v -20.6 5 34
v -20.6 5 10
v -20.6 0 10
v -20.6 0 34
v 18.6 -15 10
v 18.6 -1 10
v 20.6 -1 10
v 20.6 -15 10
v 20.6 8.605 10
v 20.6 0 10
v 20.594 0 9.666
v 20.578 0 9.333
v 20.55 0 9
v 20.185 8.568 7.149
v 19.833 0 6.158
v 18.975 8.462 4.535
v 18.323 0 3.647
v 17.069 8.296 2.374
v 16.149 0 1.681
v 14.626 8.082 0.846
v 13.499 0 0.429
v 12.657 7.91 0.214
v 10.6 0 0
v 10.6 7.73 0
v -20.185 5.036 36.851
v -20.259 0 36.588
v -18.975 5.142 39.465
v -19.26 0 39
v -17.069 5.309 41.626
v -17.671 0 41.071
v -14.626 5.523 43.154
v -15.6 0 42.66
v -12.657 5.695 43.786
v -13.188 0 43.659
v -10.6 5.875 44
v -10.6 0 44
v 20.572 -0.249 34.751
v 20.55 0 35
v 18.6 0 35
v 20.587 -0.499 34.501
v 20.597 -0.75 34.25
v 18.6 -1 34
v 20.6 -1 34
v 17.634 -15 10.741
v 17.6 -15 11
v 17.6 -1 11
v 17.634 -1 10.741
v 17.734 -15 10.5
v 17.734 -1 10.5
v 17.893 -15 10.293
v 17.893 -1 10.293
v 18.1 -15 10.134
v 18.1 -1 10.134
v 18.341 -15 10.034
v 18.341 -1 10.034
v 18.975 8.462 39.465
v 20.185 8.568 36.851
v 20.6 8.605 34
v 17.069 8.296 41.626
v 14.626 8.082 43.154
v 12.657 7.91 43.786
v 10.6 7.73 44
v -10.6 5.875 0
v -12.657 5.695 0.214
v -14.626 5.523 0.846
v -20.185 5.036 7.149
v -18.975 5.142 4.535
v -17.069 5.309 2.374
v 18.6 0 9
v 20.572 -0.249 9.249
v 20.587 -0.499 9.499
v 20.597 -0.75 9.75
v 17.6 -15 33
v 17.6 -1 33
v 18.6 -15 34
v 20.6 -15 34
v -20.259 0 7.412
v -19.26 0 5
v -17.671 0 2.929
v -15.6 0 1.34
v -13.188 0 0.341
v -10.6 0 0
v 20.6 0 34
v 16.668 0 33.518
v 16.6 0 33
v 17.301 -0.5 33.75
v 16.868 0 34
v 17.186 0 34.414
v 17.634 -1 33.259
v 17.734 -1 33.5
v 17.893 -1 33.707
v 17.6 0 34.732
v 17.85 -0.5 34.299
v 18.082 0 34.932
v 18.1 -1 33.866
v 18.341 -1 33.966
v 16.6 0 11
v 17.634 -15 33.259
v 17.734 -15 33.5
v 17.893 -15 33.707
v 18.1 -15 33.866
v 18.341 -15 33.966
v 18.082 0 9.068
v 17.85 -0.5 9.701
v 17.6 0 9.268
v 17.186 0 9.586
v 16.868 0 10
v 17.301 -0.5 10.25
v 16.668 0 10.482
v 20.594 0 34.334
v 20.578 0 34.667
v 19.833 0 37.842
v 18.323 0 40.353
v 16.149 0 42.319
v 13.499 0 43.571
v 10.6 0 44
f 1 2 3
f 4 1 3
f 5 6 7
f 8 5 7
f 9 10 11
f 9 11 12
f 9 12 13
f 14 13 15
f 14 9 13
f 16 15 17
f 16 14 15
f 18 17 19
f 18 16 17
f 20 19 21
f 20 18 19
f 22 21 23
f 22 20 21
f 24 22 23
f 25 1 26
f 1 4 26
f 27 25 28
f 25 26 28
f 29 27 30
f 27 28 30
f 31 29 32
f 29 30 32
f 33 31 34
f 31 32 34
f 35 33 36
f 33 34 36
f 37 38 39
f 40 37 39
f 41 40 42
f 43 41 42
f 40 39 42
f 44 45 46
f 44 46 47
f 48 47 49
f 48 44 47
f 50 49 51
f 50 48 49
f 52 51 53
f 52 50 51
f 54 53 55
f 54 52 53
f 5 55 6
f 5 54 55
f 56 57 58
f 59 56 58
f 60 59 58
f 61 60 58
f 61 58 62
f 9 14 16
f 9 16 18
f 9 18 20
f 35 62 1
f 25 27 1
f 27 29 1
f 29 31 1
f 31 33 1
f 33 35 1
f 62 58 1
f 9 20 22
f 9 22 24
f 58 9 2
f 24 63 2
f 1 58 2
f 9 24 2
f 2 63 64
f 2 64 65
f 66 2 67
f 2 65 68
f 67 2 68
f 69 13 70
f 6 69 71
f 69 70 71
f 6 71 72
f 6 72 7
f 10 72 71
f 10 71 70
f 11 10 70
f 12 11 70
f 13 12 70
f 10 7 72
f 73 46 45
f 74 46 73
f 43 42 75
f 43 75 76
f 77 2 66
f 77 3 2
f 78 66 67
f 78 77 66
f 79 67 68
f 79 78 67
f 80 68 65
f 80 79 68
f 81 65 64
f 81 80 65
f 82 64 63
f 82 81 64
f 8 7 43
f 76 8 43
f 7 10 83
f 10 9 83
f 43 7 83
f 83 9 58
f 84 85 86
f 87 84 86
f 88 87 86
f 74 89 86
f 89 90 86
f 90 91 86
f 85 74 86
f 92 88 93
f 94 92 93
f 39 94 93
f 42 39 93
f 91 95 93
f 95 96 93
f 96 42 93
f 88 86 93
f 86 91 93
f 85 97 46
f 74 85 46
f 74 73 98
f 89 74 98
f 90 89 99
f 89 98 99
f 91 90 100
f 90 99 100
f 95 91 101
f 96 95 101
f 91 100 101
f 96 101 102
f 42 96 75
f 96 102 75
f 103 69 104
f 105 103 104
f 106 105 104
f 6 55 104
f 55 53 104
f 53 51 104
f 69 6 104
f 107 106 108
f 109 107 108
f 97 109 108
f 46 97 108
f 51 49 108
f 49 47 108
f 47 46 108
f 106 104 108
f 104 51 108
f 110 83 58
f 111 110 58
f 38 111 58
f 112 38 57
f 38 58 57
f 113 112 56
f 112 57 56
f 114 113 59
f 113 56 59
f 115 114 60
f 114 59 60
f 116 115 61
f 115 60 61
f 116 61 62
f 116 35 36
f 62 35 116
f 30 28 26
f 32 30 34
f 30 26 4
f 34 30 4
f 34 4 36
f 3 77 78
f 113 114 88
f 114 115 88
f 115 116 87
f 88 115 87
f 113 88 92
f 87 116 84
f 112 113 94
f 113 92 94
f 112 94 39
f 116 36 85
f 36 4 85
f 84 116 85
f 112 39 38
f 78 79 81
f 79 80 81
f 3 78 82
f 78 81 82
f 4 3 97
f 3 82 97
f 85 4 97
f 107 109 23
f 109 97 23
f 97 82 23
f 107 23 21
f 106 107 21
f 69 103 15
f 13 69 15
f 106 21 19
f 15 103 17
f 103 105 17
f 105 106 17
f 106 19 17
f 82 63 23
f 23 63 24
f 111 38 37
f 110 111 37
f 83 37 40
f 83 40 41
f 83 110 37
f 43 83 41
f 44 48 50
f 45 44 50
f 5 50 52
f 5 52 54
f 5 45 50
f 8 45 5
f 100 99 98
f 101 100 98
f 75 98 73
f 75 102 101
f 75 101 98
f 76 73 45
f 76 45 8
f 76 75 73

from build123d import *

# Parameters (mm, degrees)
BOSS_EXTRUDE1_DEPTH = 44
FILLET1_R           = 10
SKETCH5_W           = 3
SKETCH5_H           = 24
BOSS_EXTRUDE3_DEPTH = 15
FILLET4_R           = 1
CHAMFER3_SIZE       = 1


with BuildPart() as part:
    # Sketch1 → Boss-Extrude1 (new body)
    with BuildSketch(Plane.XY):
        Polygon((-20.6, 0), (20.6, 0), (20.6, 8.604532937), (-20.6, 5), align=None)
    extrude(amount=BOSS_EXTRUDE1_DEPTH)

    # Fillet1
    fillet1_edges = [part.edges().sort_by_distance(p)[0] for p in [
        (20.6, 4.302266469, 44),
        (-20.6, 2.5, 44),
        (20.6, 4.302266469, 0),
        (-20.6, 2.5, 0),
    ]]
    fillet(fillet1_edges, radius=FILLET1_R)

    # Sketch5 → Boss-Extrude3 (add)
    with BuildSketch(Plane.XZ):
        with Locations((19.1, 22)):
            Rectangle(SKETCH5_W, SKETCH5_H)
    extrude(amount=BOSS_EXTRUDE3_DEPTH)

    # Fillet4
    fillet4_edges = [part.edges().sort_by_distance(p)[0] for p in [
        (17.6, -7.5, 34),
        (17.6, -7.5, 10),
    ]]
    fillet(fillet4_edges, radius=FILLET4_R)

    # Chamfer3
    # the kernel refuses this chamfer: 1 mm, written as the material it adds along each edge
    with BuildSketch(Plane(origin=(17.6, 0, 11), x_dir=(-0.9996219169112952, 0.027495876610644465, 0), z_dir=(0, 0, 1))) as chamfer3_piece_1:
        Polygon((CHAMFER3_SIZE * 0.999621916911, CHAMFER3_SIZE * 0.0274958766106), (-CHAMFER3_SIZE * 0.0274958766106, CHAMFER3_SIZE * 0.999621916911), (0, 0), align=None)
    extrude(amount=22)
    with BuildSketch(Plane(origin=(18.6, 0, 34), x_dir=(0, 0.027495876610647806, 0.999621916911295), z_dir=(1, 0, 0))) as chamfer3_piece_2_section:
        Polygon((CHAMFER3_SIZE * 0.999621916911, CHAMFER3_SIZE * 0.0274958766106), (-CHAMFER3_SIZE * 0.0274958766106, CHAMFER3_SIZE * 0.999621916911), (0, 0), align=None)
    chamfer3_piece_2 = extrude(amount=4.571682988, mode=Mode.PRIVATE)
    chamfer3_piece_2 = chamfer3_piece_2 & Plane(origin=(10.6, -0.333892015, 34), x_dir=(1, 0, 0), z_dir=(0, 1, 0)) * Cylinder(10, 14, mode=Mode.PRIVATE)
    add(chamfer3_piece_2)
    with BuildSketch(Plane(origin=(23.171682988, 0, 10), x_dir=(0, 0.02749587661058639, -0.9996219169112968), z_dir=(-1, 0, 0))) as chamfer3_piece_3_section:
        Polygon((CHAMFER3_SIZE * 0.999621916911, CHAMFER3_SIZE * 0.0274958766106), (-CHAMFER3_SIZE * 0.0274958766106, CHAMFER3_SIZE * 0.999621916911), (0, 0), align=None)
    chamfer3_piece_3 = extrude(amount=4.571682988, mode=Mode.PRIVATE)
    chamfer3_piece_3 = chamfer3_piece_3 & Plane(origin=(10.6, -0.333892015, 10), x_dir=(1, 0, 0), z_dir=(0, 1, 0)) * Cylinder(10, 14, mode=Mode.PRIVATE)
    add(chamfer3_piece_3)
    with BuildSketch(Plane(origin=(18.6, 0, 33), x_dir=(-1, 0, 0), z_dir=(0, 0, -1))) as chamfer3_piece_4:
        Polygon((1 + CHAMFER3_SIZE, 0), (1, -CHAMFER3_SIZE), (1, 0), align=None)
    revolve(axis=Axis((18.6, 0, 33), (0, 1, 0)), revolution_arc=90)
    with BuildSketch(Plane(origin=(18.6, 0, 11), x_dir=(0, 0, -1), z_dir=(1, 0, 0))) as chamfer3_piece_5:
        Polygon((1 + CHAMFER3_SIZE, 0), (1, -CHAMFER3_SIZE), (1, 0), align=None)
    revolve(axis=Axis((18.6, 0, 11), (0, 1, 0)), revolution_arc=90)


solid = part.part
